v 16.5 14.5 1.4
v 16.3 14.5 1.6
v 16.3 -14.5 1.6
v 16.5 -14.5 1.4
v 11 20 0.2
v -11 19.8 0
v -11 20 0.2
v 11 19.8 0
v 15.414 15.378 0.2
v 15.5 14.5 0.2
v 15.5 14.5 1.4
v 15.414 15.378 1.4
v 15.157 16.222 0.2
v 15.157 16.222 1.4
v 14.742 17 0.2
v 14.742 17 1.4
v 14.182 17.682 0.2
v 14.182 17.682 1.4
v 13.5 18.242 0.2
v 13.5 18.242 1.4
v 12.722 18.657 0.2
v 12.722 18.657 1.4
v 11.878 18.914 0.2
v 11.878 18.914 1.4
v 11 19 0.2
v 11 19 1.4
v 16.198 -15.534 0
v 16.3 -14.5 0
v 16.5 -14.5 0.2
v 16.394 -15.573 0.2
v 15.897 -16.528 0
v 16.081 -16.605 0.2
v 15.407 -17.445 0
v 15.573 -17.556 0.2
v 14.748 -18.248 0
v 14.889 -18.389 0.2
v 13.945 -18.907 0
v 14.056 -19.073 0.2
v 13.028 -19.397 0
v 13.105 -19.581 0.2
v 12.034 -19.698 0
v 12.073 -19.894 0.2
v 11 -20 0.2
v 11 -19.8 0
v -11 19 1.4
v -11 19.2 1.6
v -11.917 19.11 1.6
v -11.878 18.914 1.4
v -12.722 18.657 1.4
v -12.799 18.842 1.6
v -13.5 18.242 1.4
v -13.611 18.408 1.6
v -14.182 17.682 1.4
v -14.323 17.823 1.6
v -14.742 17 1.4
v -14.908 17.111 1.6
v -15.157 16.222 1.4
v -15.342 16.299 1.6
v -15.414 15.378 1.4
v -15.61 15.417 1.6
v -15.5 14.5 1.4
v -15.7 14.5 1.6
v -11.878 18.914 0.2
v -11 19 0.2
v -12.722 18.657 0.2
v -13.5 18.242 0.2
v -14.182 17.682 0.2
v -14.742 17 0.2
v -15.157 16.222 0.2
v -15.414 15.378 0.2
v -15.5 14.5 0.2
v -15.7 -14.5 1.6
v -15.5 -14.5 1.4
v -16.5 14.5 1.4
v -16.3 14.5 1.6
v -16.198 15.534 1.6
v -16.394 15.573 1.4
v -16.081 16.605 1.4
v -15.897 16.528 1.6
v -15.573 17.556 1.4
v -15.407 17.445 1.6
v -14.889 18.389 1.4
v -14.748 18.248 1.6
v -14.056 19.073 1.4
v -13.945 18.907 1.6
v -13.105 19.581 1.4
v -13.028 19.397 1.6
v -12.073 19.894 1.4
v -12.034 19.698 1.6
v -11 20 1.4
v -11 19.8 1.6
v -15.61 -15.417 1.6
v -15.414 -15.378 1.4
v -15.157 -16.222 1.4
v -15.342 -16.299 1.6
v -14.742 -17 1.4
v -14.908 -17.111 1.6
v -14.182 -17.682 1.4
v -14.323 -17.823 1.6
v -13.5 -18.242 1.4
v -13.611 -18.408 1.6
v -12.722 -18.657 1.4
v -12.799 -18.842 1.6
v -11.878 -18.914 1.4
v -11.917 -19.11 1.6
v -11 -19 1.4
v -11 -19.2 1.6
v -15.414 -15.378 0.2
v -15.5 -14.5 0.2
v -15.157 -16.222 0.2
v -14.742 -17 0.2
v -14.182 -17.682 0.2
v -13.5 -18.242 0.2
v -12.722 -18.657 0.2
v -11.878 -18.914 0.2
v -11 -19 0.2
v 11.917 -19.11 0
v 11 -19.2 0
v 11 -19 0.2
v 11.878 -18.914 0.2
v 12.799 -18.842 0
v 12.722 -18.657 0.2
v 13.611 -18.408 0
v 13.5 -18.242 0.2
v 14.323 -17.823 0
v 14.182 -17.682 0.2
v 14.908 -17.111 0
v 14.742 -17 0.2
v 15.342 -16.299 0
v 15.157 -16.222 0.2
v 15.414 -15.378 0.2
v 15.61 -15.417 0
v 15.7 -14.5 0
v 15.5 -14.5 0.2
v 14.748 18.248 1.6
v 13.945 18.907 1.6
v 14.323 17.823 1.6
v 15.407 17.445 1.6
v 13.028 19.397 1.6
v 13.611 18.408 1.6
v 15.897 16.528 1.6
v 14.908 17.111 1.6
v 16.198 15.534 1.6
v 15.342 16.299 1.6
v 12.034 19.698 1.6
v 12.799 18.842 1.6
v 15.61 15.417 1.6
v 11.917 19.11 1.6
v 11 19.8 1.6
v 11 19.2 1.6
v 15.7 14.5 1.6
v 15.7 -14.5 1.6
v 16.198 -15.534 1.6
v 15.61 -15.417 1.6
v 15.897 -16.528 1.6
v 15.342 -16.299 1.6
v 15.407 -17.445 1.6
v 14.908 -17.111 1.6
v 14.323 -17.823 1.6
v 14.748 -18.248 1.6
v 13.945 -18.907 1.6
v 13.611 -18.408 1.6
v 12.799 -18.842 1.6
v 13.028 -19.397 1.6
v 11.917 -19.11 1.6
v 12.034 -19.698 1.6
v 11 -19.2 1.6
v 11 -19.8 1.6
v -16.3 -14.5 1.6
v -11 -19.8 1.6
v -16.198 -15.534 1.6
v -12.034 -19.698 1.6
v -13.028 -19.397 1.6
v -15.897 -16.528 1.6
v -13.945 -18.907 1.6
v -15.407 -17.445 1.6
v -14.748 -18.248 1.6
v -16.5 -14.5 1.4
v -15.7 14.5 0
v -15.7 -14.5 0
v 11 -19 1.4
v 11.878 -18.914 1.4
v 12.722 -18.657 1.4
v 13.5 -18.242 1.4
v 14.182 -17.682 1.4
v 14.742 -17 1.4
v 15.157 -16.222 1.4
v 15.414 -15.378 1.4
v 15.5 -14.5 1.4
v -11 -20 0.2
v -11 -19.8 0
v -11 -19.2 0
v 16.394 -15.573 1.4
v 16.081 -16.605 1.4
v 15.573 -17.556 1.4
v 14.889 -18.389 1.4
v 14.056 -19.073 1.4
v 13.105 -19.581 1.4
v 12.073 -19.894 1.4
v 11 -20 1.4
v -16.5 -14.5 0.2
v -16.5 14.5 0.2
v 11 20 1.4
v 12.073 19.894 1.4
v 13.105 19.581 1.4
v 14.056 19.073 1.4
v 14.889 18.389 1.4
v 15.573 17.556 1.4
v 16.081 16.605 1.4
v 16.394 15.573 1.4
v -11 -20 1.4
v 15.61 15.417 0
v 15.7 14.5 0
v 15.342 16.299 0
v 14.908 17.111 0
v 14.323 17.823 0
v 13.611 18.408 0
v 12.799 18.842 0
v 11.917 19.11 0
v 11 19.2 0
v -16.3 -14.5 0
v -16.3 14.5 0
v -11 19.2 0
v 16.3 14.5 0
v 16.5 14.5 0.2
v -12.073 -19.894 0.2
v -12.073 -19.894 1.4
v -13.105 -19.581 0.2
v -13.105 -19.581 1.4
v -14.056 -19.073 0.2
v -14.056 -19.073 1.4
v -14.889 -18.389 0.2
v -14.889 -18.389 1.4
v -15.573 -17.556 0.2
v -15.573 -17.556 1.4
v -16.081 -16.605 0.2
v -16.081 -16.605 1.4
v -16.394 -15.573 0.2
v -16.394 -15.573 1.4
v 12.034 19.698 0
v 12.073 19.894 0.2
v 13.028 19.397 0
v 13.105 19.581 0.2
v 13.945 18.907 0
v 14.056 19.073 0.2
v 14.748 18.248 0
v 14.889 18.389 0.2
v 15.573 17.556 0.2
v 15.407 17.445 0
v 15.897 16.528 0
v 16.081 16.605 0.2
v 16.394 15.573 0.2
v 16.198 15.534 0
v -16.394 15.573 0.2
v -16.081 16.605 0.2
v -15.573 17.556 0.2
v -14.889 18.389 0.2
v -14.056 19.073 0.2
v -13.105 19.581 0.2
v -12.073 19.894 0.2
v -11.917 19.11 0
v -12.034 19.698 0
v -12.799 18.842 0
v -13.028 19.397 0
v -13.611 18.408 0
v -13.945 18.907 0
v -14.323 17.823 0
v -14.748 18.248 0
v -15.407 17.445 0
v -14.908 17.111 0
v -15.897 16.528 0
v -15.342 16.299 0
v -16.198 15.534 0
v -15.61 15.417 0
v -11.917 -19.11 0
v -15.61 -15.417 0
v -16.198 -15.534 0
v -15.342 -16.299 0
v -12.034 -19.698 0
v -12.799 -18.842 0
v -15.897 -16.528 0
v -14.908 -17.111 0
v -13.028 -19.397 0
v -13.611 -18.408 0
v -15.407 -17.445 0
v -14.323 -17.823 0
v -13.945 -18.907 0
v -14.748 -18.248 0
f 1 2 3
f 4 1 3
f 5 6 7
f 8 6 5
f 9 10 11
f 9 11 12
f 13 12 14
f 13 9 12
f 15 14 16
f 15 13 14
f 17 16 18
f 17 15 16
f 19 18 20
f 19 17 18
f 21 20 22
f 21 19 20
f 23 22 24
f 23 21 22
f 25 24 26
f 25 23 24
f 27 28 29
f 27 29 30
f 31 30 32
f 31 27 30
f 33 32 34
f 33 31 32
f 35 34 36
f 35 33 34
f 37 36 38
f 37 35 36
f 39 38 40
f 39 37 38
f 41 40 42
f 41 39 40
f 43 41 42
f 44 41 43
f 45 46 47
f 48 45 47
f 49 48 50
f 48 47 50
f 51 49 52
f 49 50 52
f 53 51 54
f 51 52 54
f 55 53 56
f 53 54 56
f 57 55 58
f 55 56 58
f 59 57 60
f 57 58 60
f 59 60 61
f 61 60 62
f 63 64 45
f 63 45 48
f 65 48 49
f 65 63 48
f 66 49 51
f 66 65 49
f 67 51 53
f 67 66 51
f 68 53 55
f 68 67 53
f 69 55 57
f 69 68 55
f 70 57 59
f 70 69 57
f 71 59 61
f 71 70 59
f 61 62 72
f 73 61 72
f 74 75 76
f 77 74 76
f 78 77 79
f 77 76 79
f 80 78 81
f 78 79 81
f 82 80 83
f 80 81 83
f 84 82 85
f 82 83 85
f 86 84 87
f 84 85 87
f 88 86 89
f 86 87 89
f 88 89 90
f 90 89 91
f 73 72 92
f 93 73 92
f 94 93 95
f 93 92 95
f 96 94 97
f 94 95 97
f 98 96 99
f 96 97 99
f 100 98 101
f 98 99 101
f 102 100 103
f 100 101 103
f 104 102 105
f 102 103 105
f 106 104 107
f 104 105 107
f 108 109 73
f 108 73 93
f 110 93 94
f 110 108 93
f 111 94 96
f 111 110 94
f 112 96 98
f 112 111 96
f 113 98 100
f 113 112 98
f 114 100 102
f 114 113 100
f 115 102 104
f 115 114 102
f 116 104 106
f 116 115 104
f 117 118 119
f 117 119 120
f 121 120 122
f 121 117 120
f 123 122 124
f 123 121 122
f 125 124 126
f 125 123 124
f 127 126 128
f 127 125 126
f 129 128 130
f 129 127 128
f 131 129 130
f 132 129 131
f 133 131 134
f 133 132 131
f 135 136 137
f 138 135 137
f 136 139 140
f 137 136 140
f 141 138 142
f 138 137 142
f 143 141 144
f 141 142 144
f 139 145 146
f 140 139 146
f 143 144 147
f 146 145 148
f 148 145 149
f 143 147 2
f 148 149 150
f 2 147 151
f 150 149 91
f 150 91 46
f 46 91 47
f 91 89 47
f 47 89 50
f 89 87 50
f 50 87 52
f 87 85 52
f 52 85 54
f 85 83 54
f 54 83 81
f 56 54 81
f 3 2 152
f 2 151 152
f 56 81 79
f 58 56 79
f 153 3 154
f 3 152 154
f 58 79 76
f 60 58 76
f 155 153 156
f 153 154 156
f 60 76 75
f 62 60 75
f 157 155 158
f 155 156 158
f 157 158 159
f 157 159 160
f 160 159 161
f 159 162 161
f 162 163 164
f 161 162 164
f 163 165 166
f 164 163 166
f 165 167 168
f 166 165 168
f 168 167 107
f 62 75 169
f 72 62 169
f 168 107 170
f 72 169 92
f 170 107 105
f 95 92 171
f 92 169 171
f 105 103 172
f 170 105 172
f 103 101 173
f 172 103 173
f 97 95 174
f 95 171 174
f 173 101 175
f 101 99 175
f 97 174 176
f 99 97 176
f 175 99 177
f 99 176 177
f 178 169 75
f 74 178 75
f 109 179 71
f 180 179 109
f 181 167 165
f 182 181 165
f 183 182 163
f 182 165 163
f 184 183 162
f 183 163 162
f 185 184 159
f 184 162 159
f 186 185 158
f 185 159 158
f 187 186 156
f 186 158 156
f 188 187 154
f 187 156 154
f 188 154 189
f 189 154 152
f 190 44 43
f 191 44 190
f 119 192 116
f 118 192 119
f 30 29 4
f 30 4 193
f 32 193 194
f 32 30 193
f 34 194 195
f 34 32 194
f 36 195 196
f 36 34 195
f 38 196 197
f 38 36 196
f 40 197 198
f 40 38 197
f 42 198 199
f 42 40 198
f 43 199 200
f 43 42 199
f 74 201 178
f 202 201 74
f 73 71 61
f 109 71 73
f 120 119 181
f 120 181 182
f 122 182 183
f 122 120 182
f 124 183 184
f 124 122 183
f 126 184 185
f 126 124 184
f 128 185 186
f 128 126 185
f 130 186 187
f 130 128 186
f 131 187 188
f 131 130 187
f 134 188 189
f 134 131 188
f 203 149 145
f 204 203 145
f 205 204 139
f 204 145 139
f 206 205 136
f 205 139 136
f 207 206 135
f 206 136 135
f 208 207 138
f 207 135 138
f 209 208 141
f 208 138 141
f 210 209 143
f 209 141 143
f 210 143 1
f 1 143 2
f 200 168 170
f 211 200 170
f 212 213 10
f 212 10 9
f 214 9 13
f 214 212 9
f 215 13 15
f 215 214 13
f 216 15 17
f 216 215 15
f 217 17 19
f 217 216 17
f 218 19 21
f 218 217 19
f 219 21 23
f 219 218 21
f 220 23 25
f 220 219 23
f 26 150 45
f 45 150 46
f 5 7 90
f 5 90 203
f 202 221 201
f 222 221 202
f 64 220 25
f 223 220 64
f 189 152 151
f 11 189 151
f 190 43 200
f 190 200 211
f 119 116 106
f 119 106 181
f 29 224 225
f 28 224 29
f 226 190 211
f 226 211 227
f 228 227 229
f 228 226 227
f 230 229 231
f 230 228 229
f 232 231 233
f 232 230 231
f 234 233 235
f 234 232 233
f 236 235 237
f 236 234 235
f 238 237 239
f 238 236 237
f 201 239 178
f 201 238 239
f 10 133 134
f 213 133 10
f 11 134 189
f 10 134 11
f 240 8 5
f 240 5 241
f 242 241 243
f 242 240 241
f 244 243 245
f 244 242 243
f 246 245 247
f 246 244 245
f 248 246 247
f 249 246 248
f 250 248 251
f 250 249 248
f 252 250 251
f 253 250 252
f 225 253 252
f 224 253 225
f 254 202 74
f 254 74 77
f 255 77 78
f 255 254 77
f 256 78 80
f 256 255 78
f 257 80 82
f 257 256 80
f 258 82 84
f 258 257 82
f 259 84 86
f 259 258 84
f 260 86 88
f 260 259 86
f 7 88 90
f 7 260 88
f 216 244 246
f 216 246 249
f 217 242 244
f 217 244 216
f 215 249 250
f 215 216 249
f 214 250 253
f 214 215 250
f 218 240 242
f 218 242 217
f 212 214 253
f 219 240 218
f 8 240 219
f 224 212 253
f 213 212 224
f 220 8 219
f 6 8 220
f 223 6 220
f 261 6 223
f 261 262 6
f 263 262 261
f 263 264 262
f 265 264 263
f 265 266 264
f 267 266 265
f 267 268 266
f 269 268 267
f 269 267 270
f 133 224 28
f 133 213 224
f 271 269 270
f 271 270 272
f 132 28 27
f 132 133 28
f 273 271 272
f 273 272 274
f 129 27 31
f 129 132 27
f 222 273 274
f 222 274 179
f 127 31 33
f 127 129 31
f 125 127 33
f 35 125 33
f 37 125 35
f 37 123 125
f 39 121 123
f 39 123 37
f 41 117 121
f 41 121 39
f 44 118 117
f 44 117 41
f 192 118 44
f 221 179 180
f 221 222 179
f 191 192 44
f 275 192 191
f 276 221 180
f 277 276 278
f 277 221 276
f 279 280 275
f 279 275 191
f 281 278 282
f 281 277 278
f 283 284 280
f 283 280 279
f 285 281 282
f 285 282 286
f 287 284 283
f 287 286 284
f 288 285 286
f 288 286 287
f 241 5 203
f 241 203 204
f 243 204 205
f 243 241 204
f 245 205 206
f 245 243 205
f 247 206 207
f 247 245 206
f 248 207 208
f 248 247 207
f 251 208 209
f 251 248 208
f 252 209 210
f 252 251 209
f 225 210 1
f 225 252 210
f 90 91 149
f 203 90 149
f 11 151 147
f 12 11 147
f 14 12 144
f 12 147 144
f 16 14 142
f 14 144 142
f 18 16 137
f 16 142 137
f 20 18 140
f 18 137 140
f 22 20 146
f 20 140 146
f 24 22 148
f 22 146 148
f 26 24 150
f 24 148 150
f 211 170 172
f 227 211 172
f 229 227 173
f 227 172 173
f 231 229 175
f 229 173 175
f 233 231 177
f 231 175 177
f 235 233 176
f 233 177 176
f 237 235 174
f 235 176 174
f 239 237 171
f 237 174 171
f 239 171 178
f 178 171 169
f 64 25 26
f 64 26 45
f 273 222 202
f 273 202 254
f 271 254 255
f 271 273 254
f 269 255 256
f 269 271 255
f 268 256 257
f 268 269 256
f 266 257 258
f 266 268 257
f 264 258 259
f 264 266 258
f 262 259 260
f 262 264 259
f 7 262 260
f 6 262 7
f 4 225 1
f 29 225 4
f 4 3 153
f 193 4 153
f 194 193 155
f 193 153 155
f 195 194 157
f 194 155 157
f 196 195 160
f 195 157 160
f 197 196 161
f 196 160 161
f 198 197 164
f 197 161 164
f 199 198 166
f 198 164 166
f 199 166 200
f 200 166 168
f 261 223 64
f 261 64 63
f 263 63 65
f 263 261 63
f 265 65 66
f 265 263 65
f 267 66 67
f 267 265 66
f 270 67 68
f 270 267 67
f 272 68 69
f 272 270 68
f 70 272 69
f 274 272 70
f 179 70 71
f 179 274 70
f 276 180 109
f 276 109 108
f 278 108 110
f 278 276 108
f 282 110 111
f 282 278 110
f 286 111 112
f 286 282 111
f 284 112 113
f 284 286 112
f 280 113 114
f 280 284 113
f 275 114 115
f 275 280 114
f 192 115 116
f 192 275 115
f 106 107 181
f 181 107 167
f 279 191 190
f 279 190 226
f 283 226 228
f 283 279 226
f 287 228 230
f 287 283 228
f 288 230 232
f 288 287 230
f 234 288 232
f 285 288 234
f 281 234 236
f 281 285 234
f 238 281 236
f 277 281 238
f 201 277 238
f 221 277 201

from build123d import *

# Parameters (mm, degrees)
AUFSATZ_LINEAR_AUSTRAGEN1_DEPTH = 1.6
FASE1_SIZE                      = 0.2


with BuildPart() as part:
    # Skizze1 → Aufsatz-Linear austragen1 (new body)
    with BuildSketch(Plane(origin=(0, 0, 0), x_dir=(0, 1, 0), z_dir=(0, 0, 1))):
        with BuildLine():
            Line((-20, -11), (-20, 11))
            ThreePointArc((-20, 11), (-18.389087297, 14.889087297), (-14.5, 16.5))
            Line((-14.5, 16.5), (14.5, 16.5))
            ThreePointArc((14.5, 16.5), (18.389087297, 14.889087297), (20, 11))
            Line((20, 11), (20, -11))
            ThreePointArc((20, -11), (18.389087297, -14.889087297), (14.5, -16.5))
            Line((14.5, -16.5), (-14.5, -16.5))
            ThreePointArc((-14.5, -16.5), (-18.389087297, -14.889087297), (-20, -11))
        make_face()
        with BuildLine():
            Line((-14.5, -15.5), (14.5, -15.5))
            ThreePointArc((14.5, -15.5), (17.681980515, -14.181980515), (19, -11))
            Line((19, -11), (19, 11))
            ThreePointArc((19, 11), (17.681980515, 14.181980515), (14.5, 15.5))
            Line((14.5, 15.5), (-14.5, 15.5))
            ThreePointArc((-14.5, 15.5), (-17.681980515, 14.181980515), (-19, 11))
            Line((-19, 11), (-19, -11))
            ThreePointArc((-19, -11), (-17.681980515, -14.181980515), (-14.5, -15.5))
        make_face(mode=Mode.SUBTRACT)
    extrude(amount=AUFSATZ_LINEAR_AUSTRAGEN1_DEPTH)

    # Fase1
    fase1_edges = [part.edges().sort_by_distance(p)[0] for p in [
        (16.5, 0, 0),
        (14.889087297, -18.389087297, 0),
        (0, -20, 0),
        (-14.889087297, -18.389087297, 0),
        (14.889087297, -18.389087297, 1.6),
        (16.5, 0, 1.6),
        (14.889087297, 18.389087297, 1.6),
        (0, 20, 1.6),
        (14.181980515, 17.681980515, 0),
        (0, 19, 0),
        (-14.181980515, 17.681980515, 0),
        (-15.5, 0, 0),
        (-14.889087297, 18.389087297, 1.6),
        (-14.181980515, -17.681980515, 0),
        (0, -19, 0),
        (14.181980515, -17.681980515, 0),
        (15.5, 0, 0),
        (14.181980515, 17.681980515, 1.6),
        (0, 19, 1.6),
        (-14.181980515, 17.681980515, 1.6),
        (-15.5, 0, 1.6),
        (-14.181980515, -17.681980515, 1.6),
        (0, -19, 1.6),
        (14.181980515, -17.681980515, 1.6),
        (-16.5, 0, 1.6),
        (15.5, 0, 1.6),
        (-14.889087297, -18.389087297, 1.6),
        (-16.5, 0, 0),
        (0, -20, 1.6),
        (-14.889087297, 18.389087297, 0),
        (0, 20, 0),
        (14.889087297, 18.389087297, 0),
    ]]
    chamfer(fase1_edges, length=FASE1_SIZE)


solid = part.part
